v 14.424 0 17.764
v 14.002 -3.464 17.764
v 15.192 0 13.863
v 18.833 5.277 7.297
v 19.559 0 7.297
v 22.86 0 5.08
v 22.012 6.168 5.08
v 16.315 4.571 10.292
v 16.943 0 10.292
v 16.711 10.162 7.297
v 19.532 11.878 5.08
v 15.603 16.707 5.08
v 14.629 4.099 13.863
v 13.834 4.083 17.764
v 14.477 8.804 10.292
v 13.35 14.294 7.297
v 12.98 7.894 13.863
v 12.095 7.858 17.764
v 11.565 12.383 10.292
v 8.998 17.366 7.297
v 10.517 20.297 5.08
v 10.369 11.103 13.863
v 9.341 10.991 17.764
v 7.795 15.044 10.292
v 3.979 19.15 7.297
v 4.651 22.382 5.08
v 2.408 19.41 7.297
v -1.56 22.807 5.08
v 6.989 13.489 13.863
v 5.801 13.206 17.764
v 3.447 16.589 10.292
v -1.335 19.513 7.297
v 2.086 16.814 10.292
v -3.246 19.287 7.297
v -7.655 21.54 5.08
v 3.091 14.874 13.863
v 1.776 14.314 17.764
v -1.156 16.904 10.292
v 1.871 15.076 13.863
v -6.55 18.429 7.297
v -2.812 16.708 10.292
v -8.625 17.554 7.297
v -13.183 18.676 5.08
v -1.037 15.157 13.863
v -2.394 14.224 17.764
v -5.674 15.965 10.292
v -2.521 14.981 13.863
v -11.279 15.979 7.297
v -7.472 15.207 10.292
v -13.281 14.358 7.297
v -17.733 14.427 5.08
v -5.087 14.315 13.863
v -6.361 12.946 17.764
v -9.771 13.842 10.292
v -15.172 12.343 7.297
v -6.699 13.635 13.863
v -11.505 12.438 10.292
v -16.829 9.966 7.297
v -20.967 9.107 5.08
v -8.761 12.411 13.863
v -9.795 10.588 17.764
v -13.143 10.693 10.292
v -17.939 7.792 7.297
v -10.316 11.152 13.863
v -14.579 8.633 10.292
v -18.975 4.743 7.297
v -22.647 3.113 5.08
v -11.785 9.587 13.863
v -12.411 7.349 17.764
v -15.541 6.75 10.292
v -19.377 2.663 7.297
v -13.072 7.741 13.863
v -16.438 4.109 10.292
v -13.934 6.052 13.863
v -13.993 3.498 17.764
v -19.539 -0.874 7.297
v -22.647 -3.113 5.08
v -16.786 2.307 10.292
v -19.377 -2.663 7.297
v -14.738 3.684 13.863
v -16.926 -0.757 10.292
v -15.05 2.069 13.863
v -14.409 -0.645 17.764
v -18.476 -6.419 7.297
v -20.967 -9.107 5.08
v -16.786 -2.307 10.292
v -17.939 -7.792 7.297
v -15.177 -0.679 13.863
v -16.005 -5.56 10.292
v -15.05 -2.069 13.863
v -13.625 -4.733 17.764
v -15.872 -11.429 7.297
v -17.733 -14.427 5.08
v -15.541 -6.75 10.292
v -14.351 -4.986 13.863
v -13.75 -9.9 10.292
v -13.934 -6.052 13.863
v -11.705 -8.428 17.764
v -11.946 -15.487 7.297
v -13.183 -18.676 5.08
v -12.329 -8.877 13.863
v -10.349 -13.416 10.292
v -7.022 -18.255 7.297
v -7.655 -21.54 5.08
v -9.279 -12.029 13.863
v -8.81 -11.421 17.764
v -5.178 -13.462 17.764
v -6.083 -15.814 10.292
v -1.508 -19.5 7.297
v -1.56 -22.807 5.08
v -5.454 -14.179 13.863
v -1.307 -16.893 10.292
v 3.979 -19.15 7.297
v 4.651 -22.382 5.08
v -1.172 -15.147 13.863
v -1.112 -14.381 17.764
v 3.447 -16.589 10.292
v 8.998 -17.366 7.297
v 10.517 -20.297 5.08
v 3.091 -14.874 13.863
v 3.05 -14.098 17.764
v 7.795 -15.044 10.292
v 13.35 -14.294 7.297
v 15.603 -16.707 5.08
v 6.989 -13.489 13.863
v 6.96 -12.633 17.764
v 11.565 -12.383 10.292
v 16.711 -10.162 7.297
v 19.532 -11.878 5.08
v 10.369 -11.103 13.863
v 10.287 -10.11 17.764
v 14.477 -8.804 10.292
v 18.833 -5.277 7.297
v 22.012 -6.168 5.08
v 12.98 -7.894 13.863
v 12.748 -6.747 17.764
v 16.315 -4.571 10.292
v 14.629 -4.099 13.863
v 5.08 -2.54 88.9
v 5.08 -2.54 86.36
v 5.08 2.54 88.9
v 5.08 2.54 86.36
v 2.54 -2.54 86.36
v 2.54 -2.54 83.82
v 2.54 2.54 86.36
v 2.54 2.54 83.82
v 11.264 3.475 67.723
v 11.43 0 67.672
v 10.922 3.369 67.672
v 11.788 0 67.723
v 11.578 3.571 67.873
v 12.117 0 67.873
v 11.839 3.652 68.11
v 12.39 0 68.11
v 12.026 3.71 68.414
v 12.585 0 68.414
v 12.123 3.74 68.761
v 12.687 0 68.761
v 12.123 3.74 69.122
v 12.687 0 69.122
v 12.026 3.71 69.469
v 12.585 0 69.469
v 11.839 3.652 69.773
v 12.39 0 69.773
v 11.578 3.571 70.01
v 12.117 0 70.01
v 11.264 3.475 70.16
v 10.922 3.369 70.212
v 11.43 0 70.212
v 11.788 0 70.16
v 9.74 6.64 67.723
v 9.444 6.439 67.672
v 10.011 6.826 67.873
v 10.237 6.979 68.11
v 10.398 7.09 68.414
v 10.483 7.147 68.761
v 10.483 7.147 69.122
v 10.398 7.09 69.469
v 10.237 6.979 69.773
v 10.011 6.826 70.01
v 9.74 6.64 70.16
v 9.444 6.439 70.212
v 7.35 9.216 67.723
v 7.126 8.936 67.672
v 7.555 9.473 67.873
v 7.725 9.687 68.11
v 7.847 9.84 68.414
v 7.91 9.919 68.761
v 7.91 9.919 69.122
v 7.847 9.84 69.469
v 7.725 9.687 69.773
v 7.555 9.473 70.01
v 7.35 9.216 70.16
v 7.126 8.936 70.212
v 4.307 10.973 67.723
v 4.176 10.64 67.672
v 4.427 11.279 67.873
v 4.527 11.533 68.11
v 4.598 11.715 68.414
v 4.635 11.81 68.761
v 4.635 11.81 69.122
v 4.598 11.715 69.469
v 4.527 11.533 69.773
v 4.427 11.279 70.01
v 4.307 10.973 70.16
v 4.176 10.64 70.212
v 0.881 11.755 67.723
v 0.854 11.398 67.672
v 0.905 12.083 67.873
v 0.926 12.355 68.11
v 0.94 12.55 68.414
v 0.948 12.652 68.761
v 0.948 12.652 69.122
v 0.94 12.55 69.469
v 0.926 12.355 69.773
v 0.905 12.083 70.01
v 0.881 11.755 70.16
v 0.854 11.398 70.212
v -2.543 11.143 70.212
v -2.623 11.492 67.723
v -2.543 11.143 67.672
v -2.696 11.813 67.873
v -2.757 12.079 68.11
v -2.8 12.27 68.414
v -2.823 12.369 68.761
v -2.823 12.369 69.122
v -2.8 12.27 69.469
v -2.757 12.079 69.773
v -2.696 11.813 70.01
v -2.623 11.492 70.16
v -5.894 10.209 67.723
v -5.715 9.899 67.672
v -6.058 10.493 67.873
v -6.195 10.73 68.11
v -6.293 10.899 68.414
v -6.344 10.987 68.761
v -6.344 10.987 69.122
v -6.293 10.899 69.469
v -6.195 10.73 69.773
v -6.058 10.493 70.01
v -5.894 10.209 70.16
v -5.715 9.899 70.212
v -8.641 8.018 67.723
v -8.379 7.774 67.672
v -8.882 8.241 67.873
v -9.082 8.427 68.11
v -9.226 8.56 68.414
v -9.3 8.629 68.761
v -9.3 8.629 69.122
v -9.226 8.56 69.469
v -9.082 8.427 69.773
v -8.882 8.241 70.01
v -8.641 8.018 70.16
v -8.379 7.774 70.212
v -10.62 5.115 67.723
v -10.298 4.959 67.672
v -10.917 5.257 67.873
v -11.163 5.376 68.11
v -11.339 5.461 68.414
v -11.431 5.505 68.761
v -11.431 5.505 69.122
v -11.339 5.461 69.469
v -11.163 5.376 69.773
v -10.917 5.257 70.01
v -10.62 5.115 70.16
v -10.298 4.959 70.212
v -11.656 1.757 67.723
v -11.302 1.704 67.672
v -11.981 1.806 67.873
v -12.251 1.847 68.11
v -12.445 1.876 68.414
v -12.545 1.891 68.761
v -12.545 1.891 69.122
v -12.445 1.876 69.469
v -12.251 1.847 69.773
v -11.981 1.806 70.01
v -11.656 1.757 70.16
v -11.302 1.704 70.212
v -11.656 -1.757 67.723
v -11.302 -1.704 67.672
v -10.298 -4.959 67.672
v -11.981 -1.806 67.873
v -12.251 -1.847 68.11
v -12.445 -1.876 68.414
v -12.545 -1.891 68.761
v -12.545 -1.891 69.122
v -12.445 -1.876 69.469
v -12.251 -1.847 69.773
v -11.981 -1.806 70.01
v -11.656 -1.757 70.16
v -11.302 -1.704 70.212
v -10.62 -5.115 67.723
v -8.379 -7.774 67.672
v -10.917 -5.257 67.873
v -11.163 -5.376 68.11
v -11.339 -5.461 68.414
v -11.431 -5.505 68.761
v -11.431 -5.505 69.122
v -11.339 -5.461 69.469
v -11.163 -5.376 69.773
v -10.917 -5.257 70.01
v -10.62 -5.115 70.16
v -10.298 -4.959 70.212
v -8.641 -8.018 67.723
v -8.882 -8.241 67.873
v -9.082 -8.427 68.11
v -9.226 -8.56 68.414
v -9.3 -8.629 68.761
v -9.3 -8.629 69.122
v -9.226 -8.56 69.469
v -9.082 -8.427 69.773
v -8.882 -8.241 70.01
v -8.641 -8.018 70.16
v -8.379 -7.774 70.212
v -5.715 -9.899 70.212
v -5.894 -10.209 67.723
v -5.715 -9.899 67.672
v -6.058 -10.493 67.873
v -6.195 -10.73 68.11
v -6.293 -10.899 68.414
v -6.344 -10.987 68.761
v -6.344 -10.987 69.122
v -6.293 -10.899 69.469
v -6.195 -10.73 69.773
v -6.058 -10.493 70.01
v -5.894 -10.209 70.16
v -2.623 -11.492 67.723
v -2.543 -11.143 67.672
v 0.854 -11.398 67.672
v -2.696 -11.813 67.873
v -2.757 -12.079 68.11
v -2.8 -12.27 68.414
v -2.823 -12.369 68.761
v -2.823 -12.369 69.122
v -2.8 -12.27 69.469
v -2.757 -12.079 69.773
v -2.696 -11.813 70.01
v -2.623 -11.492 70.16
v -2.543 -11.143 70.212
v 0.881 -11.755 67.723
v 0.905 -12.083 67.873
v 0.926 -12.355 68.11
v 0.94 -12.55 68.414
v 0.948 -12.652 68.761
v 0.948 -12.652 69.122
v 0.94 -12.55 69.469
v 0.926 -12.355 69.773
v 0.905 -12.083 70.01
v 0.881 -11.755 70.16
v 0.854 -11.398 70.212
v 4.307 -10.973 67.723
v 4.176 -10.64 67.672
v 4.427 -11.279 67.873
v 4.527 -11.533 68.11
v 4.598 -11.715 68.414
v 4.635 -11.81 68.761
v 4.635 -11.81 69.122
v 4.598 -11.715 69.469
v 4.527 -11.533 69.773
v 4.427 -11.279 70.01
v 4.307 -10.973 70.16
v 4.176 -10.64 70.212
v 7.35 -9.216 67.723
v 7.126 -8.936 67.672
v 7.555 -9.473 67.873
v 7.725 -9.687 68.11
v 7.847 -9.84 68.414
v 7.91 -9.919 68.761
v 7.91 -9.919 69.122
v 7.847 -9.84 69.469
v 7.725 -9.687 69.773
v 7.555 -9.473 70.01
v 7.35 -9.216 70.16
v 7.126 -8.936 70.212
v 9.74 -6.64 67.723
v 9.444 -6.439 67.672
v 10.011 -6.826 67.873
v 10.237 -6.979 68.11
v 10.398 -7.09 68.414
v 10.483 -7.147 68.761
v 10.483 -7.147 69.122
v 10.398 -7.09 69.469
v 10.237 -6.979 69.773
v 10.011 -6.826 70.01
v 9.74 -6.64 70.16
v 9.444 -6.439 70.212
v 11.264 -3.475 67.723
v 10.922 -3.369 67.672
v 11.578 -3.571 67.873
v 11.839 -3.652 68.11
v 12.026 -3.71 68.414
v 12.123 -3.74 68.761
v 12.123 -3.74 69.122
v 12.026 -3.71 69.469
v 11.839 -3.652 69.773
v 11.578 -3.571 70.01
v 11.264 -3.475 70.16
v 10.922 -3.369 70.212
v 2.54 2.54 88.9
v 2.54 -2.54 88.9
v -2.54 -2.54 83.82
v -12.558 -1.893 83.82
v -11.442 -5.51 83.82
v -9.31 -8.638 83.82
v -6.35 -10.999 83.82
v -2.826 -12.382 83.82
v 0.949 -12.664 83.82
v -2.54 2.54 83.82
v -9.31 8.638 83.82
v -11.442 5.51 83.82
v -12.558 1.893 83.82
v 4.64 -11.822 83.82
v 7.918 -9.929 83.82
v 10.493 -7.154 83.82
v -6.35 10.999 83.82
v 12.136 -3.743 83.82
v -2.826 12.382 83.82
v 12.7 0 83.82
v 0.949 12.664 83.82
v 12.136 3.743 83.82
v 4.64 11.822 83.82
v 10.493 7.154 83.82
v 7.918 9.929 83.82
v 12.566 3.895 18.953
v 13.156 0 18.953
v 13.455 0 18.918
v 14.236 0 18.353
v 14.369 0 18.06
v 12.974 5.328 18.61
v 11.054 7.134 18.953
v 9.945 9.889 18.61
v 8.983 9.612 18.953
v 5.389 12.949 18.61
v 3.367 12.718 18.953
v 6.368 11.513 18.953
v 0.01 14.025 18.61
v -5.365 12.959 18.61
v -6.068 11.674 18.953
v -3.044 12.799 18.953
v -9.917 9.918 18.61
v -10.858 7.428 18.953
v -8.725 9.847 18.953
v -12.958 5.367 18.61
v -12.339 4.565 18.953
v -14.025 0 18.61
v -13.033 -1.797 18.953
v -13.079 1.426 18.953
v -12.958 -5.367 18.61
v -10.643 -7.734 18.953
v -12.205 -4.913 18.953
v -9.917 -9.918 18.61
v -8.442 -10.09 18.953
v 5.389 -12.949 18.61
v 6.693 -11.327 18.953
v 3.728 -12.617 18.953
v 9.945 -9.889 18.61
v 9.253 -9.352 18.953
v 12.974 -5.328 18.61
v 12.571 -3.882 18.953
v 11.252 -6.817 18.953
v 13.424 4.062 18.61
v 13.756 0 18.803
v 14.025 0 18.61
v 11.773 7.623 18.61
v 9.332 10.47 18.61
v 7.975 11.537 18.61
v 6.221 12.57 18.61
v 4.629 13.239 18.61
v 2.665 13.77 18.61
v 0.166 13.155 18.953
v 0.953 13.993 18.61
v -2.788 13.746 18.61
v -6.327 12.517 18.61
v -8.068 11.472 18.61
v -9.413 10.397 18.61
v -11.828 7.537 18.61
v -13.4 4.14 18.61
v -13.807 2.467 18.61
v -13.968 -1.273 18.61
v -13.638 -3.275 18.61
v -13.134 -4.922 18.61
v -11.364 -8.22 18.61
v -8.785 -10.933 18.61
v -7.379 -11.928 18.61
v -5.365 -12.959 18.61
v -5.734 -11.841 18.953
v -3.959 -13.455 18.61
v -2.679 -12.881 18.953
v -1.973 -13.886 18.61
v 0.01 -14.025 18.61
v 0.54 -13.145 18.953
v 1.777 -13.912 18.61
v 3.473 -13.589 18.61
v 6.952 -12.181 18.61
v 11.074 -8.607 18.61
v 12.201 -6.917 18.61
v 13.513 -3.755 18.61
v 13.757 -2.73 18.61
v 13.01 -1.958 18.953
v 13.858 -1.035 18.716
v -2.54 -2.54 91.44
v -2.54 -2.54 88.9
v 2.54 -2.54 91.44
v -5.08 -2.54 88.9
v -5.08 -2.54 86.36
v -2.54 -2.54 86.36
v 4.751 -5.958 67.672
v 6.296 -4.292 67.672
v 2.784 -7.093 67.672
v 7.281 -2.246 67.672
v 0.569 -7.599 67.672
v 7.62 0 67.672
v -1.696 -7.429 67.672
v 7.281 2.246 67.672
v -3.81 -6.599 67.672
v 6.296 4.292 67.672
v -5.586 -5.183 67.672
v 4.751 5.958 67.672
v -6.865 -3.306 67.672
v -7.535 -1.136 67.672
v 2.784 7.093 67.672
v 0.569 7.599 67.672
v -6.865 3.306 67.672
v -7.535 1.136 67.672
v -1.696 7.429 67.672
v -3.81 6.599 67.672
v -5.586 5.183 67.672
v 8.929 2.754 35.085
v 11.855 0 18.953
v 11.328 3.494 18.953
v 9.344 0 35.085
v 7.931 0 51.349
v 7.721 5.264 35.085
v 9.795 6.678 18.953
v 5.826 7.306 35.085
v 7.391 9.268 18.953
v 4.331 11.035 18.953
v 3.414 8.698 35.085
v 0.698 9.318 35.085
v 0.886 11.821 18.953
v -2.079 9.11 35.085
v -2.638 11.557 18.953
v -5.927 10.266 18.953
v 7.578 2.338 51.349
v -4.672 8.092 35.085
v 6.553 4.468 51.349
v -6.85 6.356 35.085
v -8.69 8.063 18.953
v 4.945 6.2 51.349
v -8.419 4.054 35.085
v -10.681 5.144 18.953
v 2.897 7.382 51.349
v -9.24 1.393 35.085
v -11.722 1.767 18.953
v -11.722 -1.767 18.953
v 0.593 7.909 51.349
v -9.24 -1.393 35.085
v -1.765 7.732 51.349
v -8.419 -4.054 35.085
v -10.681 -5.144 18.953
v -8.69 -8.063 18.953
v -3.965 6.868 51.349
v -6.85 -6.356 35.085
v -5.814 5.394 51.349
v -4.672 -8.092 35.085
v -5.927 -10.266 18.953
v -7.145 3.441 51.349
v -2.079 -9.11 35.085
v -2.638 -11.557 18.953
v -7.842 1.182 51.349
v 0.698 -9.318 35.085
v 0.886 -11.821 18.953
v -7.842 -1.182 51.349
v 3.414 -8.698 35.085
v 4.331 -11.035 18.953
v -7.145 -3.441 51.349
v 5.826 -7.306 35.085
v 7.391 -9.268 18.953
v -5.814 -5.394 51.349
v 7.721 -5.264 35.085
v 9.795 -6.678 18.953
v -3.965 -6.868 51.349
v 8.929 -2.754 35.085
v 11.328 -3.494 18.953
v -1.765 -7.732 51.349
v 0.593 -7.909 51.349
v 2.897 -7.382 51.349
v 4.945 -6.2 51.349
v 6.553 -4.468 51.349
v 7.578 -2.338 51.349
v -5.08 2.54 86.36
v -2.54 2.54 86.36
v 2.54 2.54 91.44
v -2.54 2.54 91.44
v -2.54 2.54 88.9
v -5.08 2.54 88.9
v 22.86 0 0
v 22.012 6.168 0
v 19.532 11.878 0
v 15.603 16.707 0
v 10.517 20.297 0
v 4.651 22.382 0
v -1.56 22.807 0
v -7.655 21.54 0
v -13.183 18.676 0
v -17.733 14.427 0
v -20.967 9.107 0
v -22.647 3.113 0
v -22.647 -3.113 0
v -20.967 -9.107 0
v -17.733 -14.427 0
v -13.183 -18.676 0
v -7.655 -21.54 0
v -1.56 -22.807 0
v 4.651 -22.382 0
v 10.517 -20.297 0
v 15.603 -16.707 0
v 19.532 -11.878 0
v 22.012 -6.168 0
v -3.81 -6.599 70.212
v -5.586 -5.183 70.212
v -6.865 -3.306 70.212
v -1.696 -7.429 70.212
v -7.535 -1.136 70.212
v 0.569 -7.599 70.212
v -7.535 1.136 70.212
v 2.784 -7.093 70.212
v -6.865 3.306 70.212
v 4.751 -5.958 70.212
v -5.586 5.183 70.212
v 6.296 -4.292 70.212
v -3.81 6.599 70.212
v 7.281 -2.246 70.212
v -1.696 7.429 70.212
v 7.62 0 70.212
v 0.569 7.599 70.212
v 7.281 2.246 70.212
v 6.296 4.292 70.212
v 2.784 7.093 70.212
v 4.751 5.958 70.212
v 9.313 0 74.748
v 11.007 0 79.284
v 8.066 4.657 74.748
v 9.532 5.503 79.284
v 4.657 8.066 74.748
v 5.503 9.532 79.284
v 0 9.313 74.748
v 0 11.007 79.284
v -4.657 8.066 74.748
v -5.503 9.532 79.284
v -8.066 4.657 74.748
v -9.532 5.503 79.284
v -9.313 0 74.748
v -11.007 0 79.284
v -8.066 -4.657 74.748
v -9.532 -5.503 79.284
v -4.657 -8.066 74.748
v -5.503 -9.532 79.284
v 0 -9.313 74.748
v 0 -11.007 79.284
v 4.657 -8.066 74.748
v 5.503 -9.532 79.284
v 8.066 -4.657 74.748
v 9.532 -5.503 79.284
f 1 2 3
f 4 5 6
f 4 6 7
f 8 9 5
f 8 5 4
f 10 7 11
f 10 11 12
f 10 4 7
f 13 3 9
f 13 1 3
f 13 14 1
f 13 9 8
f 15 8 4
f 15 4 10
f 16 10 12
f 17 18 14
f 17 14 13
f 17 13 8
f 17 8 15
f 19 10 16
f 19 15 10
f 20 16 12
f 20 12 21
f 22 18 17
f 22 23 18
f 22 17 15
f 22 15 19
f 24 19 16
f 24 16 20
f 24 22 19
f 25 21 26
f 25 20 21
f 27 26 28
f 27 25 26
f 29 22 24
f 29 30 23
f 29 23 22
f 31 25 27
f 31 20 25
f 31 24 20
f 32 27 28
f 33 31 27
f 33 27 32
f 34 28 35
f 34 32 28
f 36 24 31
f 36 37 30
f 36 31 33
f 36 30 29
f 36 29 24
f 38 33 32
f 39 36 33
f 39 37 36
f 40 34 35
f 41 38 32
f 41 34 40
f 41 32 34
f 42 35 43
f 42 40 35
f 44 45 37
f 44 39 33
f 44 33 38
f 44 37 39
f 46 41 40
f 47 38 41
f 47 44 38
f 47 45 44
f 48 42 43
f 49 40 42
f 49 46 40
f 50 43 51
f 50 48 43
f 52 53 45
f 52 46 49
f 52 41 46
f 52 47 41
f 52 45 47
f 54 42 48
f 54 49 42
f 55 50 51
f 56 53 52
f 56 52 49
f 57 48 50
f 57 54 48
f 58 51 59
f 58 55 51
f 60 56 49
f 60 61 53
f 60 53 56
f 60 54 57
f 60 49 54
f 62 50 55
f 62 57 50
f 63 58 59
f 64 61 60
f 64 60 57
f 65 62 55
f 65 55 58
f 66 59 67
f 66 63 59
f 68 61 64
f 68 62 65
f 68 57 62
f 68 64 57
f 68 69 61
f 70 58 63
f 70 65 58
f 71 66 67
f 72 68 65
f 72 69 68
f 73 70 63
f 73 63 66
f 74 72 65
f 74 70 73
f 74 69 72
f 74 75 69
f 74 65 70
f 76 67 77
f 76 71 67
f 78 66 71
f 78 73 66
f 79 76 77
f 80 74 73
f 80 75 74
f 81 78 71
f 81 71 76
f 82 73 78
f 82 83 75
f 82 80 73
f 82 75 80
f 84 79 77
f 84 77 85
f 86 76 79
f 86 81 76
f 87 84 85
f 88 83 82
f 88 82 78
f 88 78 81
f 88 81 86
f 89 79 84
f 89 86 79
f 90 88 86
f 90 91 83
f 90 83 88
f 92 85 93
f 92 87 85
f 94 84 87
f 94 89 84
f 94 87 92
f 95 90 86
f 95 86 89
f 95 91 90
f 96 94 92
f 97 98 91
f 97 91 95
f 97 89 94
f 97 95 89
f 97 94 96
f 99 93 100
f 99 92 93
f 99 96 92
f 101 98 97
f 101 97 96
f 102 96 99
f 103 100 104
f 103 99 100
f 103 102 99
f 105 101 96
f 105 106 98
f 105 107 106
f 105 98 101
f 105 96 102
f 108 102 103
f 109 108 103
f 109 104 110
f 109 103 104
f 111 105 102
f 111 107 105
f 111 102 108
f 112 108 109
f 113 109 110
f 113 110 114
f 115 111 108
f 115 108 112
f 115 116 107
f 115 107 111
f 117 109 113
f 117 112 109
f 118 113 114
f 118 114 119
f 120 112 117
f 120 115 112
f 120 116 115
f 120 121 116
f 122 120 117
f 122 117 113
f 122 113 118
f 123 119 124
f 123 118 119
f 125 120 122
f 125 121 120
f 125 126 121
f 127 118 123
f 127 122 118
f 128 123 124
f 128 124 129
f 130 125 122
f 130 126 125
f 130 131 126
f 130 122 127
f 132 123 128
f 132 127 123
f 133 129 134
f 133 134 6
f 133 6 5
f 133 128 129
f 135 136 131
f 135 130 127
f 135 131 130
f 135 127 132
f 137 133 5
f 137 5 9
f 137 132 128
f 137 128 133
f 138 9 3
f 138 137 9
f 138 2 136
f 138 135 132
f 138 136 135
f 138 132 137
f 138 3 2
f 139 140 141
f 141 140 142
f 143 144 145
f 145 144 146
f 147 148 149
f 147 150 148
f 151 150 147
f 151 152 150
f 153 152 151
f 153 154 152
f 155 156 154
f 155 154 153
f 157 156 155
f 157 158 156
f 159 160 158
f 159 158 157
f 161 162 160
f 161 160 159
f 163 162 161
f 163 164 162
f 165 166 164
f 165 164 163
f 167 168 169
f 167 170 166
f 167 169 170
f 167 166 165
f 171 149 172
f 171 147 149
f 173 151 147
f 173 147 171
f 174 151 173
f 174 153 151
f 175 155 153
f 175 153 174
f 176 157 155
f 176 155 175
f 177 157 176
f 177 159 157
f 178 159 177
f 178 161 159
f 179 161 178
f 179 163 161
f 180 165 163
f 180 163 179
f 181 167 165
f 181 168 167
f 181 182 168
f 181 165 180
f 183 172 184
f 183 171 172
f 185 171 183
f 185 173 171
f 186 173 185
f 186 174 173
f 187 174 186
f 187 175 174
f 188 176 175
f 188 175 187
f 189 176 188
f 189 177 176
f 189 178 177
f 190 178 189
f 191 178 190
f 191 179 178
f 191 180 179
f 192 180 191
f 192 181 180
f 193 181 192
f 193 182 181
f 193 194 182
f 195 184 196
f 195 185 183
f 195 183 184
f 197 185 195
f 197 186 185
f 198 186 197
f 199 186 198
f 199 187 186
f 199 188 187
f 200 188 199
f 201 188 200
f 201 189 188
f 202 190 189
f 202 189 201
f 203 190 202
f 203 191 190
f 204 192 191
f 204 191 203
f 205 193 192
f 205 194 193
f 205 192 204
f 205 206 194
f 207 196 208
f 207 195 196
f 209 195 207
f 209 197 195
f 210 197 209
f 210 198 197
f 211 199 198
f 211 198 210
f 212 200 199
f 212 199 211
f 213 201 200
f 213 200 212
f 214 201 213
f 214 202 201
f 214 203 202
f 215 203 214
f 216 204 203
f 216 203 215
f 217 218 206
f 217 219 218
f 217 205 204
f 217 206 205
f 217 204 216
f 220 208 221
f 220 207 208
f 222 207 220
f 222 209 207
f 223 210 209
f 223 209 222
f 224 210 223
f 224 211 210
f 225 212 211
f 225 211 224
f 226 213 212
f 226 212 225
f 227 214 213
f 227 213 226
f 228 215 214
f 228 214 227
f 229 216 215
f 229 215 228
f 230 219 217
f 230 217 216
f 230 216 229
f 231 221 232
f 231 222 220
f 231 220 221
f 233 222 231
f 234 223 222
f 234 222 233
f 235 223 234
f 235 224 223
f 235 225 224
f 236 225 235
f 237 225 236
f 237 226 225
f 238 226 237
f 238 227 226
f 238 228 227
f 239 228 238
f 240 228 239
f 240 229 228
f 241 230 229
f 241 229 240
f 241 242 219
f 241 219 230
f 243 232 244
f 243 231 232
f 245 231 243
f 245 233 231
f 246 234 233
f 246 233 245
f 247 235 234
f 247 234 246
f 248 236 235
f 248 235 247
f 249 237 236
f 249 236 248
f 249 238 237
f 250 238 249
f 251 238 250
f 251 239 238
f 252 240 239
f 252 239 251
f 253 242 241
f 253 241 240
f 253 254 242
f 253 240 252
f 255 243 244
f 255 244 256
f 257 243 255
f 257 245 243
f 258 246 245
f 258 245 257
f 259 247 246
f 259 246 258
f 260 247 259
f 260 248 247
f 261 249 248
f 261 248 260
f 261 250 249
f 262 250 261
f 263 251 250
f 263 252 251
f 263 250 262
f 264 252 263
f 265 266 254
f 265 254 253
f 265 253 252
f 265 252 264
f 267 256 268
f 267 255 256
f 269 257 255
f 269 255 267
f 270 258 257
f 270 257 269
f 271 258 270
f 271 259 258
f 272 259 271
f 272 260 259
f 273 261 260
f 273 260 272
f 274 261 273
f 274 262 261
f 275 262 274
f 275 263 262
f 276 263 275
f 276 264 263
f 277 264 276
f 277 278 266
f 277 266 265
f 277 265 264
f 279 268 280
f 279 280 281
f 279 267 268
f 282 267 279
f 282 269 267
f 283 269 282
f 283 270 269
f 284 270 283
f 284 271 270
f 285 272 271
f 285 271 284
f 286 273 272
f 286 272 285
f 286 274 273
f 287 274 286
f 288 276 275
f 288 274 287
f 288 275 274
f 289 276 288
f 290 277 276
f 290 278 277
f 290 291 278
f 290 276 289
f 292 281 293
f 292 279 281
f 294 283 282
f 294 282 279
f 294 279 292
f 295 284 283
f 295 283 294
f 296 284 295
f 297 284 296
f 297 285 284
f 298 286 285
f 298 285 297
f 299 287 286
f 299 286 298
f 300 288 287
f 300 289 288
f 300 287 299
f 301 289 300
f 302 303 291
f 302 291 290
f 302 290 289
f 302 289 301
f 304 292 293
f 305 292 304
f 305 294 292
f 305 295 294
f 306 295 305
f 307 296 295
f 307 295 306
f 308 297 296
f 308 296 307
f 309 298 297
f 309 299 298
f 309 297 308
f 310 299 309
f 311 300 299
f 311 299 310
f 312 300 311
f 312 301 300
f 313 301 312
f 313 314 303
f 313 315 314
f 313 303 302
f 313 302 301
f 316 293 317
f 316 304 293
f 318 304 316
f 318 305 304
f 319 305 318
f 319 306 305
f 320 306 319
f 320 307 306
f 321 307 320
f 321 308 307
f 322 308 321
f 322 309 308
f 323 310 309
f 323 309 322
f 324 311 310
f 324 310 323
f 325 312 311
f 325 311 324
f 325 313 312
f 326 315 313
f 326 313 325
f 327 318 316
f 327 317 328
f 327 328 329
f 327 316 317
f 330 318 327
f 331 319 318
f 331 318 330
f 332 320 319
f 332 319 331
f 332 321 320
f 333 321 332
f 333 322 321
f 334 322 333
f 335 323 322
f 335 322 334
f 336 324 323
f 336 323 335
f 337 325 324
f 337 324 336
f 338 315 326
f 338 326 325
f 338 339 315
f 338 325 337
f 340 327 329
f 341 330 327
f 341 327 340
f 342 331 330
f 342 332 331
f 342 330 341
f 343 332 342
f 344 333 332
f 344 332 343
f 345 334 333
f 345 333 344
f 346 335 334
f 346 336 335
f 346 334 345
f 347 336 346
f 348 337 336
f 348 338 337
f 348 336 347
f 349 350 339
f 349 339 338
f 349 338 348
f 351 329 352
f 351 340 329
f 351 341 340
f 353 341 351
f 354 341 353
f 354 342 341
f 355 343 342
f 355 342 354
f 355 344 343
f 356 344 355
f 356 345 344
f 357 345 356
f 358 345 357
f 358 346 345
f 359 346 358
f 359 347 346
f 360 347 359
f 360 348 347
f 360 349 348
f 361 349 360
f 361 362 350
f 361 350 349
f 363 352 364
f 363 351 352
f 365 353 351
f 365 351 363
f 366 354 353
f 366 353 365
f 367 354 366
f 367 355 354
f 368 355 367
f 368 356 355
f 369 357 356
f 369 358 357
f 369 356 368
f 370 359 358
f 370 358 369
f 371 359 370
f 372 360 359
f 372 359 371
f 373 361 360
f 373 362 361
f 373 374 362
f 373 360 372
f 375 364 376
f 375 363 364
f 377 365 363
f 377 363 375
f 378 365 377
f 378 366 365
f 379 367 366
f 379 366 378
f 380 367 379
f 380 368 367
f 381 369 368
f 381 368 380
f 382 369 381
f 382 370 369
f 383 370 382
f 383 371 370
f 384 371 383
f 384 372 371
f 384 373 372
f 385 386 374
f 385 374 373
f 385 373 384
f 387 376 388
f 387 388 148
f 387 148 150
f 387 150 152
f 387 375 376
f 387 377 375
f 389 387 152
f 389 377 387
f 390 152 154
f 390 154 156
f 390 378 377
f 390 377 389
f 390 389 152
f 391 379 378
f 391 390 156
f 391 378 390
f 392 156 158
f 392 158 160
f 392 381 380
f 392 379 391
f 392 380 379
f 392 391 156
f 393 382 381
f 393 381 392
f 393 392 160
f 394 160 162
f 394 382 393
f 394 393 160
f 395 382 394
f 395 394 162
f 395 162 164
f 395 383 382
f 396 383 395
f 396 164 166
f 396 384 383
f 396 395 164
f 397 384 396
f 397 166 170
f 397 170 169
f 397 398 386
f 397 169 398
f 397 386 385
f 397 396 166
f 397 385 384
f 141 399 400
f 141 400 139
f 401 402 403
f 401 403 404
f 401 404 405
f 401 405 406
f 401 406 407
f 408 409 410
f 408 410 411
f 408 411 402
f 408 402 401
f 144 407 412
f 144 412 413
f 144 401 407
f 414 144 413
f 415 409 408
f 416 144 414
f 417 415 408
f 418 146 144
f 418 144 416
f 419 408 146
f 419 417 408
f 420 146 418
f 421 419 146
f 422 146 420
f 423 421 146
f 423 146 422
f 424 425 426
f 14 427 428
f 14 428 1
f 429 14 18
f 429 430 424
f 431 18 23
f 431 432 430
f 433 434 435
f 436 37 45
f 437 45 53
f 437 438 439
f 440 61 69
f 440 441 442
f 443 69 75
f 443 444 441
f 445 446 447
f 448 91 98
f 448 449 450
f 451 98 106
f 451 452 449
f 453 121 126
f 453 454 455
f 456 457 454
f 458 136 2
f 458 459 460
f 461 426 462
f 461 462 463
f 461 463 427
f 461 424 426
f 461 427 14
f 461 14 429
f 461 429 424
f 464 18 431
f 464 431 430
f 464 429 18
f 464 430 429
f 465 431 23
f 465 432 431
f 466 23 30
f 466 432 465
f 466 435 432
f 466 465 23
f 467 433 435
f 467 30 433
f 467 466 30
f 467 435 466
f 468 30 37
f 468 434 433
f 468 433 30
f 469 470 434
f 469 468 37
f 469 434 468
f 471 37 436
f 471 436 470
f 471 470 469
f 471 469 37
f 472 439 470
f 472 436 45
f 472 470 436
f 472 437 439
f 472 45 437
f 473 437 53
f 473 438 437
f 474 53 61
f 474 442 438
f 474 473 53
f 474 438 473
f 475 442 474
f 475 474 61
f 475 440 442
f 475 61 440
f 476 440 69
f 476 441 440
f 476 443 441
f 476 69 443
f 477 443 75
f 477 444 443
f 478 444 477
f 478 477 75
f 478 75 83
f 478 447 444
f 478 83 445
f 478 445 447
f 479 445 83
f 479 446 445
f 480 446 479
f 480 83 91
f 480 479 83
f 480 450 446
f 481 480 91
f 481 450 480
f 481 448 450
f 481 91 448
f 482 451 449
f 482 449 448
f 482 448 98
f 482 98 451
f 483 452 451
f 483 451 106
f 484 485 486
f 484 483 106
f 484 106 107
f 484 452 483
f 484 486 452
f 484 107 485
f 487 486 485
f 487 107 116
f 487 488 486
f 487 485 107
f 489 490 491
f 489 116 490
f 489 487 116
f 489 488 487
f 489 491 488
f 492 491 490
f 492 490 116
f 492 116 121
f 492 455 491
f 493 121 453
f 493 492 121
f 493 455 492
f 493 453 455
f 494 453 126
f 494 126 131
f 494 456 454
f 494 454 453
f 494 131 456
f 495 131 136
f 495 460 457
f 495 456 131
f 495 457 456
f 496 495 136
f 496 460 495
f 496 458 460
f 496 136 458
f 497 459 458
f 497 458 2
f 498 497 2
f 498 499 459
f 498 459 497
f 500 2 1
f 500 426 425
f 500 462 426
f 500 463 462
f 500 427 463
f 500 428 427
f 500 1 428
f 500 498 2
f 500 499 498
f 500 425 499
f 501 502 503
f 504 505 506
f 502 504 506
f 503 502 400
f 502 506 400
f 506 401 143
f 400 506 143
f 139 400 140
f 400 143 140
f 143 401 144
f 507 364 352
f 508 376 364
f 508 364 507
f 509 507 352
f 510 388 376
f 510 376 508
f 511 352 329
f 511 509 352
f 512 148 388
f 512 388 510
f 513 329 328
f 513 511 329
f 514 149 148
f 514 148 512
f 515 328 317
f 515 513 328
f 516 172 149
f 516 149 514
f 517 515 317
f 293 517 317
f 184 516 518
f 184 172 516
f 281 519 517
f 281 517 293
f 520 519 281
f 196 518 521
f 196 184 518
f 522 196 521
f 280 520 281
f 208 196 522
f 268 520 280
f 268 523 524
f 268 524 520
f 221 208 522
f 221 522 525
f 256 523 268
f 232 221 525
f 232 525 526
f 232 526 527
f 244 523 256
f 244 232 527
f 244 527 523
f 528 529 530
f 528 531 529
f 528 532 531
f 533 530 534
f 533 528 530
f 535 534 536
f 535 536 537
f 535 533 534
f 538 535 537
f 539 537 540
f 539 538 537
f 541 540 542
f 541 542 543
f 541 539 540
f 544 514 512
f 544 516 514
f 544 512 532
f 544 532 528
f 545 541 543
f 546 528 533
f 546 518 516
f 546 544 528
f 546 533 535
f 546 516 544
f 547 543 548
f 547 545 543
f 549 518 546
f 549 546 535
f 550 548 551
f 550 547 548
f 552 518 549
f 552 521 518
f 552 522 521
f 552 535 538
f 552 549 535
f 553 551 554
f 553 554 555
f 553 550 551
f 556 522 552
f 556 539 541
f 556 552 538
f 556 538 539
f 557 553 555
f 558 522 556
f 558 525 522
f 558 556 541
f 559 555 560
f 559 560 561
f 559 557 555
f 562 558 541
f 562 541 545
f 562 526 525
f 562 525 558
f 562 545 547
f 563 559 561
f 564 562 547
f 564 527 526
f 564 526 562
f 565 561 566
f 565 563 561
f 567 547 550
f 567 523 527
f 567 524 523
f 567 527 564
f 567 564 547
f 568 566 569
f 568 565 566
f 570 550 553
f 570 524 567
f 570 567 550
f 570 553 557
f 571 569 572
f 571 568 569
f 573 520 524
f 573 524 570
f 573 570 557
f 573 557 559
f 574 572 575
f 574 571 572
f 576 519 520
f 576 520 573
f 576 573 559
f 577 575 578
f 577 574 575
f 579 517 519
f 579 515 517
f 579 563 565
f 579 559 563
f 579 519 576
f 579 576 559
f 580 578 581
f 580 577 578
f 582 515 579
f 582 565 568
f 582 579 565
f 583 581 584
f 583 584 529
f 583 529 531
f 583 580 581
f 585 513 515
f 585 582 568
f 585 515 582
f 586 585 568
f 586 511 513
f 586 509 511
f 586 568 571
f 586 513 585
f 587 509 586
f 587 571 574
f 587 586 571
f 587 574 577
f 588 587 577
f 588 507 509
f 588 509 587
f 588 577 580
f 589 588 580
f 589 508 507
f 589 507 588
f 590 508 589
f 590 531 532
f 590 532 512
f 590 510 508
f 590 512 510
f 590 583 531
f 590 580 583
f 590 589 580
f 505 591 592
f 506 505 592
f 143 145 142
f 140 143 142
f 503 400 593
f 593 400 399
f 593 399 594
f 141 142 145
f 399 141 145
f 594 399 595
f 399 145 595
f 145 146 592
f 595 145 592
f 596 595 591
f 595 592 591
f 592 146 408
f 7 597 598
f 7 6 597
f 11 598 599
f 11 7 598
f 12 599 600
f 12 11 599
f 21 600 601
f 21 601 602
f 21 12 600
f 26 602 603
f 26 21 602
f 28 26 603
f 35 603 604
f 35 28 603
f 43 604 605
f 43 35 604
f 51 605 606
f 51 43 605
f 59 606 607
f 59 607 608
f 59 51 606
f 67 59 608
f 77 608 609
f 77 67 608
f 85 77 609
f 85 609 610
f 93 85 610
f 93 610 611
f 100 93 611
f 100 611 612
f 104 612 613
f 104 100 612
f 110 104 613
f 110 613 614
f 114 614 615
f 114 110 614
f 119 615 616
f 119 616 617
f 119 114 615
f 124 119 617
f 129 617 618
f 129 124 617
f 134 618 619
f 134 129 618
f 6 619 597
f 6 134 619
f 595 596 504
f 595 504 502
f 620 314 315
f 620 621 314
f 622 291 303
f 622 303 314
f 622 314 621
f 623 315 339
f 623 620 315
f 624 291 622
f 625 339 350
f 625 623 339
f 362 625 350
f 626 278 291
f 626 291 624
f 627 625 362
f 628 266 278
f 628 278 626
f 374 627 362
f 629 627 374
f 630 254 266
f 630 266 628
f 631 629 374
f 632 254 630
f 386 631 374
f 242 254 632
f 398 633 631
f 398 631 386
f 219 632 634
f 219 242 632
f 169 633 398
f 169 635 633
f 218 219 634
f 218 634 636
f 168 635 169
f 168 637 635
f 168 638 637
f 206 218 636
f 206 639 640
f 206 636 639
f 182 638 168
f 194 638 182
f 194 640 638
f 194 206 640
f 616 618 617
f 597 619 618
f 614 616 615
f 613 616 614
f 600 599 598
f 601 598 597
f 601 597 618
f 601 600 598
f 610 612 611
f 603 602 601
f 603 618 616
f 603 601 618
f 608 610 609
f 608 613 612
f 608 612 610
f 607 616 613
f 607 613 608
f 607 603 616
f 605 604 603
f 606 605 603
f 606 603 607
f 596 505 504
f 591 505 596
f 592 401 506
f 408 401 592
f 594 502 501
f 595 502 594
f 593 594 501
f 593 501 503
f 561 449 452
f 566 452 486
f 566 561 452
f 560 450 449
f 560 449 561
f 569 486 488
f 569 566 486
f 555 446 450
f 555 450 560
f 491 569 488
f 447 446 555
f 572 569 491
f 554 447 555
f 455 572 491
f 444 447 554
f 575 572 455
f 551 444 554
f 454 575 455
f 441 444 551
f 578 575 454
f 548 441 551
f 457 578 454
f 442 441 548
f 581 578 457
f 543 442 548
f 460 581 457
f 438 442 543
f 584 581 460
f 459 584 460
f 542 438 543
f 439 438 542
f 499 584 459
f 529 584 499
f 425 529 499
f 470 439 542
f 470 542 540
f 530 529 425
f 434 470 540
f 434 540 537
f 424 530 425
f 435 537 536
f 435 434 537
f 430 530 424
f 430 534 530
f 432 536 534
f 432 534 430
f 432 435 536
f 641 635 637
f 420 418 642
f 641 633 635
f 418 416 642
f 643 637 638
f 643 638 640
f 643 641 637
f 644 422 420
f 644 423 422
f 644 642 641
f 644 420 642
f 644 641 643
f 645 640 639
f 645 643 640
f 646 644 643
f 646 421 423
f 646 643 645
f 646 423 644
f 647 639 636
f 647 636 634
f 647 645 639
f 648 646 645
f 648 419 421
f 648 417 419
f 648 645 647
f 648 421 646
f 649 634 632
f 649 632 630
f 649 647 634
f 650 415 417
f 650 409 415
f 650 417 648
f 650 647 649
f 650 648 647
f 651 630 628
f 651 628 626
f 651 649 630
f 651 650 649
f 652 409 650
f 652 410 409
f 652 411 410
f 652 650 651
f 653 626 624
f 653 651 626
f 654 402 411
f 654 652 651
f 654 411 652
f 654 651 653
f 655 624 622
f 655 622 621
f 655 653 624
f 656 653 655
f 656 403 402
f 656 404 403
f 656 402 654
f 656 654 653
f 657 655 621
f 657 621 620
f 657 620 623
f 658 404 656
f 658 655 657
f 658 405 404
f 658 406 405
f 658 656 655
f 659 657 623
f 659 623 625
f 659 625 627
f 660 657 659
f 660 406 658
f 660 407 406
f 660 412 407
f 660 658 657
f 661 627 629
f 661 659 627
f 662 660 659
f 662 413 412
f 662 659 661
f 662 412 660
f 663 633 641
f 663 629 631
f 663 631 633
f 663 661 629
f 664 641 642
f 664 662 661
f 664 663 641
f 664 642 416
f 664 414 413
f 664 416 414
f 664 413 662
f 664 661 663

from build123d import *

# Parameters (mm, degrees)
F2_W     = 5.08
F2_H     = 5.08
F3_DEPTH = 2.54
F4_W     = 2.54
F4_H     = 5.08
F4_W_2   = 5.08
F5_DEPTH = 2.54
F6_W     = 5.08
F6_H     = 5.08
F7_DEPTH = 2.54
F8_R     = 1.27


with BuildPart() as f1:
    # F0 (on Front) → F1 (revolve)
    with BuildSketch(Plane.XZ):
        with BuildLine():
            Line((0, 83.82), (0, 0))
            Line((0, 0), (22.86, 0))
            Line((22.86, 0), (22.86, 5.08))
            ThreePointArc((22.86, 5.08), (16.6236237238, 10.7941273506), (14.3945977767, 18.9534829479))
            Line((14.3945977767, 18.9534829479), (11.8545977767, 18.9534829479))
            ThreePointArc((11.8545977767, 18.9534829479), (8.4999635218, 43.2049976701), (7.62, 67.6716116881))
            Line((7.62, 67.6716116881), (11.43, 67.6716116881))
            ThreePointArc((11.43, 67.6716116881), (12.7, 68.9416116881), (11.43, 70.2116116881))
            Line((11.43, 70.2116116881), (7.62, 70.2116116881))
            Line((7.62, 70.2116116881), (12.7, 83.82))
            Line((12.7, 83.82), (0, 83.82))
        make_face()
    revolve(axis=Axis((0, 0, 41.91), (0, 0, 1)))

    # F2 (on face) → F3 (join)
    with BuildSketch(Plane.XY.offset(83.82)):
        Rectangle(F2_W, F2_H)
    extrude(amount=F3_DEPTH)

    # F4 (on face) → F5 (join)
    with BuildSketch(Plane.XY.offset(86.36)):
        with Locations((-3.81, 0)):
            Rectangle(F4_W, F4_H)
        Rectangle(F4_W_2, F4_H)
        with Locations((3.81, 0)):
            Rectangle(F4_W, F4_H)
    extrude(amount=F5_DEPTH)

    # F6 (on face) → F7 (join)
    with BuildSketch(Plane.XY.offset(88.9)):
        Rectangle(F6_W, F6_H)
    extrude(amount=F7_DEPTH)

    # F8
    f8_edges = [f1.edges().sort_by_distance(p)[0] for p in [
        (-14.394598, 0, 18.953483),
    ]]
    fillet(f8_edges, radius=F8_R)


solid = f1.part
